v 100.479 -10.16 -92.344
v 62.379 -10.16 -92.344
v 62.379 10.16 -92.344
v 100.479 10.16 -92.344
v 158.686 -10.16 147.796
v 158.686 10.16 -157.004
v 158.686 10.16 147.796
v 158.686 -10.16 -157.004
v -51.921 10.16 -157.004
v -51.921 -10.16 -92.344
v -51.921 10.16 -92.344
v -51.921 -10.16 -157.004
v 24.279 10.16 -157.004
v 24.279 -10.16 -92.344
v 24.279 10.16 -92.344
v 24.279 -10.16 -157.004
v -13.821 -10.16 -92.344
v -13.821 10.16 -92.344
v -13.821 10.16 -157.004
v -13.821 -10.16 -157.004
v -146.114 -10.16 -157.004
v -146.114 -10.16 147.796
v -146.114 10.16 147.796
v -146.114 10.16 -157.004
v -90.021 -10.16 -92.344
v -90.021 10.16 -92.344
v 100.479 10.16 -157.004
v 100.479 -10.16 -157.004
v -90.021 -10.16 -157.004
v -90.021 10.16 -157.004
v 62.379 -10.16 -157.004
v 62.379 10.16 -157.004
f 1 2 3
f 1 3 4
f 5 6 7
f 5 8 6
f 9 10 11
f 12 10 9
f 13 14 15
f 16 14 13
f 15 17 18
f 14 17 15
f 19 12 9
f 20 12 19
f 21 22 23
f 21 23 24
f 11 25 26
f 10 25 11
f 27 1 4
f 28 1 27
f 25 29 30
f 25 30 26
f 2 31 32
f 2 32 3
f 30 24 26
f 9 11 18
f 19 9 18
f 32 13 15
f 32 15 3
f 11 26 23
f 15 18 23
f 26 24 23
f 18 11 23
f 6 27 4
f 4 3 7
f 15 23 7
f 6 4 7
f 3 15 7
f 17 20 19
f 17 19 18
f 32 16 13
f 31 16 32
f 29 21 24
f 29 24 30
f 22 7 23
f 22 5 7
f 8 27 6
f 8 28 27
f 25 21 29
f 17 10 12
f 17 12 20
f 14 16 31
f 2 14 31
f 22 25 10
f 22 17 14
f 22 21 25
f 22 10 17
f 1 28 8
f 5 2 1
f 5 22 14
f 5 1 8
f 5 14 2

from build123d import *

# Parameters (mm, degrees)
F1_DEPTH = 10.16


with BuildPart() as f1:
    # F0 (on Front) → F1 (new body, symmetric)
    with BuildSketch(Plane.XZ):
        Polygon((158.686374, 147.795809), (-146.113626, 147.795809), (-146.113626, -157.004191), (-90.020779, -157.004191), (-90.020779, -92.344157), (-51.920779, -92.344157), (-51.920779, -157.004191), (-13.820779, -157.004191), (-13.820779, -92.344157), (24.279221, -92.344157), (24.279221, -157.004191), (62.379221, -157.004191), (62.379221, -92.344157), (100.479221, -92.344157), (100.479221, -157.004191), (158.686374, -157.004191), align=None)
    extrude(amount=F1_DEPTH, both=True)


solid = f1.part
